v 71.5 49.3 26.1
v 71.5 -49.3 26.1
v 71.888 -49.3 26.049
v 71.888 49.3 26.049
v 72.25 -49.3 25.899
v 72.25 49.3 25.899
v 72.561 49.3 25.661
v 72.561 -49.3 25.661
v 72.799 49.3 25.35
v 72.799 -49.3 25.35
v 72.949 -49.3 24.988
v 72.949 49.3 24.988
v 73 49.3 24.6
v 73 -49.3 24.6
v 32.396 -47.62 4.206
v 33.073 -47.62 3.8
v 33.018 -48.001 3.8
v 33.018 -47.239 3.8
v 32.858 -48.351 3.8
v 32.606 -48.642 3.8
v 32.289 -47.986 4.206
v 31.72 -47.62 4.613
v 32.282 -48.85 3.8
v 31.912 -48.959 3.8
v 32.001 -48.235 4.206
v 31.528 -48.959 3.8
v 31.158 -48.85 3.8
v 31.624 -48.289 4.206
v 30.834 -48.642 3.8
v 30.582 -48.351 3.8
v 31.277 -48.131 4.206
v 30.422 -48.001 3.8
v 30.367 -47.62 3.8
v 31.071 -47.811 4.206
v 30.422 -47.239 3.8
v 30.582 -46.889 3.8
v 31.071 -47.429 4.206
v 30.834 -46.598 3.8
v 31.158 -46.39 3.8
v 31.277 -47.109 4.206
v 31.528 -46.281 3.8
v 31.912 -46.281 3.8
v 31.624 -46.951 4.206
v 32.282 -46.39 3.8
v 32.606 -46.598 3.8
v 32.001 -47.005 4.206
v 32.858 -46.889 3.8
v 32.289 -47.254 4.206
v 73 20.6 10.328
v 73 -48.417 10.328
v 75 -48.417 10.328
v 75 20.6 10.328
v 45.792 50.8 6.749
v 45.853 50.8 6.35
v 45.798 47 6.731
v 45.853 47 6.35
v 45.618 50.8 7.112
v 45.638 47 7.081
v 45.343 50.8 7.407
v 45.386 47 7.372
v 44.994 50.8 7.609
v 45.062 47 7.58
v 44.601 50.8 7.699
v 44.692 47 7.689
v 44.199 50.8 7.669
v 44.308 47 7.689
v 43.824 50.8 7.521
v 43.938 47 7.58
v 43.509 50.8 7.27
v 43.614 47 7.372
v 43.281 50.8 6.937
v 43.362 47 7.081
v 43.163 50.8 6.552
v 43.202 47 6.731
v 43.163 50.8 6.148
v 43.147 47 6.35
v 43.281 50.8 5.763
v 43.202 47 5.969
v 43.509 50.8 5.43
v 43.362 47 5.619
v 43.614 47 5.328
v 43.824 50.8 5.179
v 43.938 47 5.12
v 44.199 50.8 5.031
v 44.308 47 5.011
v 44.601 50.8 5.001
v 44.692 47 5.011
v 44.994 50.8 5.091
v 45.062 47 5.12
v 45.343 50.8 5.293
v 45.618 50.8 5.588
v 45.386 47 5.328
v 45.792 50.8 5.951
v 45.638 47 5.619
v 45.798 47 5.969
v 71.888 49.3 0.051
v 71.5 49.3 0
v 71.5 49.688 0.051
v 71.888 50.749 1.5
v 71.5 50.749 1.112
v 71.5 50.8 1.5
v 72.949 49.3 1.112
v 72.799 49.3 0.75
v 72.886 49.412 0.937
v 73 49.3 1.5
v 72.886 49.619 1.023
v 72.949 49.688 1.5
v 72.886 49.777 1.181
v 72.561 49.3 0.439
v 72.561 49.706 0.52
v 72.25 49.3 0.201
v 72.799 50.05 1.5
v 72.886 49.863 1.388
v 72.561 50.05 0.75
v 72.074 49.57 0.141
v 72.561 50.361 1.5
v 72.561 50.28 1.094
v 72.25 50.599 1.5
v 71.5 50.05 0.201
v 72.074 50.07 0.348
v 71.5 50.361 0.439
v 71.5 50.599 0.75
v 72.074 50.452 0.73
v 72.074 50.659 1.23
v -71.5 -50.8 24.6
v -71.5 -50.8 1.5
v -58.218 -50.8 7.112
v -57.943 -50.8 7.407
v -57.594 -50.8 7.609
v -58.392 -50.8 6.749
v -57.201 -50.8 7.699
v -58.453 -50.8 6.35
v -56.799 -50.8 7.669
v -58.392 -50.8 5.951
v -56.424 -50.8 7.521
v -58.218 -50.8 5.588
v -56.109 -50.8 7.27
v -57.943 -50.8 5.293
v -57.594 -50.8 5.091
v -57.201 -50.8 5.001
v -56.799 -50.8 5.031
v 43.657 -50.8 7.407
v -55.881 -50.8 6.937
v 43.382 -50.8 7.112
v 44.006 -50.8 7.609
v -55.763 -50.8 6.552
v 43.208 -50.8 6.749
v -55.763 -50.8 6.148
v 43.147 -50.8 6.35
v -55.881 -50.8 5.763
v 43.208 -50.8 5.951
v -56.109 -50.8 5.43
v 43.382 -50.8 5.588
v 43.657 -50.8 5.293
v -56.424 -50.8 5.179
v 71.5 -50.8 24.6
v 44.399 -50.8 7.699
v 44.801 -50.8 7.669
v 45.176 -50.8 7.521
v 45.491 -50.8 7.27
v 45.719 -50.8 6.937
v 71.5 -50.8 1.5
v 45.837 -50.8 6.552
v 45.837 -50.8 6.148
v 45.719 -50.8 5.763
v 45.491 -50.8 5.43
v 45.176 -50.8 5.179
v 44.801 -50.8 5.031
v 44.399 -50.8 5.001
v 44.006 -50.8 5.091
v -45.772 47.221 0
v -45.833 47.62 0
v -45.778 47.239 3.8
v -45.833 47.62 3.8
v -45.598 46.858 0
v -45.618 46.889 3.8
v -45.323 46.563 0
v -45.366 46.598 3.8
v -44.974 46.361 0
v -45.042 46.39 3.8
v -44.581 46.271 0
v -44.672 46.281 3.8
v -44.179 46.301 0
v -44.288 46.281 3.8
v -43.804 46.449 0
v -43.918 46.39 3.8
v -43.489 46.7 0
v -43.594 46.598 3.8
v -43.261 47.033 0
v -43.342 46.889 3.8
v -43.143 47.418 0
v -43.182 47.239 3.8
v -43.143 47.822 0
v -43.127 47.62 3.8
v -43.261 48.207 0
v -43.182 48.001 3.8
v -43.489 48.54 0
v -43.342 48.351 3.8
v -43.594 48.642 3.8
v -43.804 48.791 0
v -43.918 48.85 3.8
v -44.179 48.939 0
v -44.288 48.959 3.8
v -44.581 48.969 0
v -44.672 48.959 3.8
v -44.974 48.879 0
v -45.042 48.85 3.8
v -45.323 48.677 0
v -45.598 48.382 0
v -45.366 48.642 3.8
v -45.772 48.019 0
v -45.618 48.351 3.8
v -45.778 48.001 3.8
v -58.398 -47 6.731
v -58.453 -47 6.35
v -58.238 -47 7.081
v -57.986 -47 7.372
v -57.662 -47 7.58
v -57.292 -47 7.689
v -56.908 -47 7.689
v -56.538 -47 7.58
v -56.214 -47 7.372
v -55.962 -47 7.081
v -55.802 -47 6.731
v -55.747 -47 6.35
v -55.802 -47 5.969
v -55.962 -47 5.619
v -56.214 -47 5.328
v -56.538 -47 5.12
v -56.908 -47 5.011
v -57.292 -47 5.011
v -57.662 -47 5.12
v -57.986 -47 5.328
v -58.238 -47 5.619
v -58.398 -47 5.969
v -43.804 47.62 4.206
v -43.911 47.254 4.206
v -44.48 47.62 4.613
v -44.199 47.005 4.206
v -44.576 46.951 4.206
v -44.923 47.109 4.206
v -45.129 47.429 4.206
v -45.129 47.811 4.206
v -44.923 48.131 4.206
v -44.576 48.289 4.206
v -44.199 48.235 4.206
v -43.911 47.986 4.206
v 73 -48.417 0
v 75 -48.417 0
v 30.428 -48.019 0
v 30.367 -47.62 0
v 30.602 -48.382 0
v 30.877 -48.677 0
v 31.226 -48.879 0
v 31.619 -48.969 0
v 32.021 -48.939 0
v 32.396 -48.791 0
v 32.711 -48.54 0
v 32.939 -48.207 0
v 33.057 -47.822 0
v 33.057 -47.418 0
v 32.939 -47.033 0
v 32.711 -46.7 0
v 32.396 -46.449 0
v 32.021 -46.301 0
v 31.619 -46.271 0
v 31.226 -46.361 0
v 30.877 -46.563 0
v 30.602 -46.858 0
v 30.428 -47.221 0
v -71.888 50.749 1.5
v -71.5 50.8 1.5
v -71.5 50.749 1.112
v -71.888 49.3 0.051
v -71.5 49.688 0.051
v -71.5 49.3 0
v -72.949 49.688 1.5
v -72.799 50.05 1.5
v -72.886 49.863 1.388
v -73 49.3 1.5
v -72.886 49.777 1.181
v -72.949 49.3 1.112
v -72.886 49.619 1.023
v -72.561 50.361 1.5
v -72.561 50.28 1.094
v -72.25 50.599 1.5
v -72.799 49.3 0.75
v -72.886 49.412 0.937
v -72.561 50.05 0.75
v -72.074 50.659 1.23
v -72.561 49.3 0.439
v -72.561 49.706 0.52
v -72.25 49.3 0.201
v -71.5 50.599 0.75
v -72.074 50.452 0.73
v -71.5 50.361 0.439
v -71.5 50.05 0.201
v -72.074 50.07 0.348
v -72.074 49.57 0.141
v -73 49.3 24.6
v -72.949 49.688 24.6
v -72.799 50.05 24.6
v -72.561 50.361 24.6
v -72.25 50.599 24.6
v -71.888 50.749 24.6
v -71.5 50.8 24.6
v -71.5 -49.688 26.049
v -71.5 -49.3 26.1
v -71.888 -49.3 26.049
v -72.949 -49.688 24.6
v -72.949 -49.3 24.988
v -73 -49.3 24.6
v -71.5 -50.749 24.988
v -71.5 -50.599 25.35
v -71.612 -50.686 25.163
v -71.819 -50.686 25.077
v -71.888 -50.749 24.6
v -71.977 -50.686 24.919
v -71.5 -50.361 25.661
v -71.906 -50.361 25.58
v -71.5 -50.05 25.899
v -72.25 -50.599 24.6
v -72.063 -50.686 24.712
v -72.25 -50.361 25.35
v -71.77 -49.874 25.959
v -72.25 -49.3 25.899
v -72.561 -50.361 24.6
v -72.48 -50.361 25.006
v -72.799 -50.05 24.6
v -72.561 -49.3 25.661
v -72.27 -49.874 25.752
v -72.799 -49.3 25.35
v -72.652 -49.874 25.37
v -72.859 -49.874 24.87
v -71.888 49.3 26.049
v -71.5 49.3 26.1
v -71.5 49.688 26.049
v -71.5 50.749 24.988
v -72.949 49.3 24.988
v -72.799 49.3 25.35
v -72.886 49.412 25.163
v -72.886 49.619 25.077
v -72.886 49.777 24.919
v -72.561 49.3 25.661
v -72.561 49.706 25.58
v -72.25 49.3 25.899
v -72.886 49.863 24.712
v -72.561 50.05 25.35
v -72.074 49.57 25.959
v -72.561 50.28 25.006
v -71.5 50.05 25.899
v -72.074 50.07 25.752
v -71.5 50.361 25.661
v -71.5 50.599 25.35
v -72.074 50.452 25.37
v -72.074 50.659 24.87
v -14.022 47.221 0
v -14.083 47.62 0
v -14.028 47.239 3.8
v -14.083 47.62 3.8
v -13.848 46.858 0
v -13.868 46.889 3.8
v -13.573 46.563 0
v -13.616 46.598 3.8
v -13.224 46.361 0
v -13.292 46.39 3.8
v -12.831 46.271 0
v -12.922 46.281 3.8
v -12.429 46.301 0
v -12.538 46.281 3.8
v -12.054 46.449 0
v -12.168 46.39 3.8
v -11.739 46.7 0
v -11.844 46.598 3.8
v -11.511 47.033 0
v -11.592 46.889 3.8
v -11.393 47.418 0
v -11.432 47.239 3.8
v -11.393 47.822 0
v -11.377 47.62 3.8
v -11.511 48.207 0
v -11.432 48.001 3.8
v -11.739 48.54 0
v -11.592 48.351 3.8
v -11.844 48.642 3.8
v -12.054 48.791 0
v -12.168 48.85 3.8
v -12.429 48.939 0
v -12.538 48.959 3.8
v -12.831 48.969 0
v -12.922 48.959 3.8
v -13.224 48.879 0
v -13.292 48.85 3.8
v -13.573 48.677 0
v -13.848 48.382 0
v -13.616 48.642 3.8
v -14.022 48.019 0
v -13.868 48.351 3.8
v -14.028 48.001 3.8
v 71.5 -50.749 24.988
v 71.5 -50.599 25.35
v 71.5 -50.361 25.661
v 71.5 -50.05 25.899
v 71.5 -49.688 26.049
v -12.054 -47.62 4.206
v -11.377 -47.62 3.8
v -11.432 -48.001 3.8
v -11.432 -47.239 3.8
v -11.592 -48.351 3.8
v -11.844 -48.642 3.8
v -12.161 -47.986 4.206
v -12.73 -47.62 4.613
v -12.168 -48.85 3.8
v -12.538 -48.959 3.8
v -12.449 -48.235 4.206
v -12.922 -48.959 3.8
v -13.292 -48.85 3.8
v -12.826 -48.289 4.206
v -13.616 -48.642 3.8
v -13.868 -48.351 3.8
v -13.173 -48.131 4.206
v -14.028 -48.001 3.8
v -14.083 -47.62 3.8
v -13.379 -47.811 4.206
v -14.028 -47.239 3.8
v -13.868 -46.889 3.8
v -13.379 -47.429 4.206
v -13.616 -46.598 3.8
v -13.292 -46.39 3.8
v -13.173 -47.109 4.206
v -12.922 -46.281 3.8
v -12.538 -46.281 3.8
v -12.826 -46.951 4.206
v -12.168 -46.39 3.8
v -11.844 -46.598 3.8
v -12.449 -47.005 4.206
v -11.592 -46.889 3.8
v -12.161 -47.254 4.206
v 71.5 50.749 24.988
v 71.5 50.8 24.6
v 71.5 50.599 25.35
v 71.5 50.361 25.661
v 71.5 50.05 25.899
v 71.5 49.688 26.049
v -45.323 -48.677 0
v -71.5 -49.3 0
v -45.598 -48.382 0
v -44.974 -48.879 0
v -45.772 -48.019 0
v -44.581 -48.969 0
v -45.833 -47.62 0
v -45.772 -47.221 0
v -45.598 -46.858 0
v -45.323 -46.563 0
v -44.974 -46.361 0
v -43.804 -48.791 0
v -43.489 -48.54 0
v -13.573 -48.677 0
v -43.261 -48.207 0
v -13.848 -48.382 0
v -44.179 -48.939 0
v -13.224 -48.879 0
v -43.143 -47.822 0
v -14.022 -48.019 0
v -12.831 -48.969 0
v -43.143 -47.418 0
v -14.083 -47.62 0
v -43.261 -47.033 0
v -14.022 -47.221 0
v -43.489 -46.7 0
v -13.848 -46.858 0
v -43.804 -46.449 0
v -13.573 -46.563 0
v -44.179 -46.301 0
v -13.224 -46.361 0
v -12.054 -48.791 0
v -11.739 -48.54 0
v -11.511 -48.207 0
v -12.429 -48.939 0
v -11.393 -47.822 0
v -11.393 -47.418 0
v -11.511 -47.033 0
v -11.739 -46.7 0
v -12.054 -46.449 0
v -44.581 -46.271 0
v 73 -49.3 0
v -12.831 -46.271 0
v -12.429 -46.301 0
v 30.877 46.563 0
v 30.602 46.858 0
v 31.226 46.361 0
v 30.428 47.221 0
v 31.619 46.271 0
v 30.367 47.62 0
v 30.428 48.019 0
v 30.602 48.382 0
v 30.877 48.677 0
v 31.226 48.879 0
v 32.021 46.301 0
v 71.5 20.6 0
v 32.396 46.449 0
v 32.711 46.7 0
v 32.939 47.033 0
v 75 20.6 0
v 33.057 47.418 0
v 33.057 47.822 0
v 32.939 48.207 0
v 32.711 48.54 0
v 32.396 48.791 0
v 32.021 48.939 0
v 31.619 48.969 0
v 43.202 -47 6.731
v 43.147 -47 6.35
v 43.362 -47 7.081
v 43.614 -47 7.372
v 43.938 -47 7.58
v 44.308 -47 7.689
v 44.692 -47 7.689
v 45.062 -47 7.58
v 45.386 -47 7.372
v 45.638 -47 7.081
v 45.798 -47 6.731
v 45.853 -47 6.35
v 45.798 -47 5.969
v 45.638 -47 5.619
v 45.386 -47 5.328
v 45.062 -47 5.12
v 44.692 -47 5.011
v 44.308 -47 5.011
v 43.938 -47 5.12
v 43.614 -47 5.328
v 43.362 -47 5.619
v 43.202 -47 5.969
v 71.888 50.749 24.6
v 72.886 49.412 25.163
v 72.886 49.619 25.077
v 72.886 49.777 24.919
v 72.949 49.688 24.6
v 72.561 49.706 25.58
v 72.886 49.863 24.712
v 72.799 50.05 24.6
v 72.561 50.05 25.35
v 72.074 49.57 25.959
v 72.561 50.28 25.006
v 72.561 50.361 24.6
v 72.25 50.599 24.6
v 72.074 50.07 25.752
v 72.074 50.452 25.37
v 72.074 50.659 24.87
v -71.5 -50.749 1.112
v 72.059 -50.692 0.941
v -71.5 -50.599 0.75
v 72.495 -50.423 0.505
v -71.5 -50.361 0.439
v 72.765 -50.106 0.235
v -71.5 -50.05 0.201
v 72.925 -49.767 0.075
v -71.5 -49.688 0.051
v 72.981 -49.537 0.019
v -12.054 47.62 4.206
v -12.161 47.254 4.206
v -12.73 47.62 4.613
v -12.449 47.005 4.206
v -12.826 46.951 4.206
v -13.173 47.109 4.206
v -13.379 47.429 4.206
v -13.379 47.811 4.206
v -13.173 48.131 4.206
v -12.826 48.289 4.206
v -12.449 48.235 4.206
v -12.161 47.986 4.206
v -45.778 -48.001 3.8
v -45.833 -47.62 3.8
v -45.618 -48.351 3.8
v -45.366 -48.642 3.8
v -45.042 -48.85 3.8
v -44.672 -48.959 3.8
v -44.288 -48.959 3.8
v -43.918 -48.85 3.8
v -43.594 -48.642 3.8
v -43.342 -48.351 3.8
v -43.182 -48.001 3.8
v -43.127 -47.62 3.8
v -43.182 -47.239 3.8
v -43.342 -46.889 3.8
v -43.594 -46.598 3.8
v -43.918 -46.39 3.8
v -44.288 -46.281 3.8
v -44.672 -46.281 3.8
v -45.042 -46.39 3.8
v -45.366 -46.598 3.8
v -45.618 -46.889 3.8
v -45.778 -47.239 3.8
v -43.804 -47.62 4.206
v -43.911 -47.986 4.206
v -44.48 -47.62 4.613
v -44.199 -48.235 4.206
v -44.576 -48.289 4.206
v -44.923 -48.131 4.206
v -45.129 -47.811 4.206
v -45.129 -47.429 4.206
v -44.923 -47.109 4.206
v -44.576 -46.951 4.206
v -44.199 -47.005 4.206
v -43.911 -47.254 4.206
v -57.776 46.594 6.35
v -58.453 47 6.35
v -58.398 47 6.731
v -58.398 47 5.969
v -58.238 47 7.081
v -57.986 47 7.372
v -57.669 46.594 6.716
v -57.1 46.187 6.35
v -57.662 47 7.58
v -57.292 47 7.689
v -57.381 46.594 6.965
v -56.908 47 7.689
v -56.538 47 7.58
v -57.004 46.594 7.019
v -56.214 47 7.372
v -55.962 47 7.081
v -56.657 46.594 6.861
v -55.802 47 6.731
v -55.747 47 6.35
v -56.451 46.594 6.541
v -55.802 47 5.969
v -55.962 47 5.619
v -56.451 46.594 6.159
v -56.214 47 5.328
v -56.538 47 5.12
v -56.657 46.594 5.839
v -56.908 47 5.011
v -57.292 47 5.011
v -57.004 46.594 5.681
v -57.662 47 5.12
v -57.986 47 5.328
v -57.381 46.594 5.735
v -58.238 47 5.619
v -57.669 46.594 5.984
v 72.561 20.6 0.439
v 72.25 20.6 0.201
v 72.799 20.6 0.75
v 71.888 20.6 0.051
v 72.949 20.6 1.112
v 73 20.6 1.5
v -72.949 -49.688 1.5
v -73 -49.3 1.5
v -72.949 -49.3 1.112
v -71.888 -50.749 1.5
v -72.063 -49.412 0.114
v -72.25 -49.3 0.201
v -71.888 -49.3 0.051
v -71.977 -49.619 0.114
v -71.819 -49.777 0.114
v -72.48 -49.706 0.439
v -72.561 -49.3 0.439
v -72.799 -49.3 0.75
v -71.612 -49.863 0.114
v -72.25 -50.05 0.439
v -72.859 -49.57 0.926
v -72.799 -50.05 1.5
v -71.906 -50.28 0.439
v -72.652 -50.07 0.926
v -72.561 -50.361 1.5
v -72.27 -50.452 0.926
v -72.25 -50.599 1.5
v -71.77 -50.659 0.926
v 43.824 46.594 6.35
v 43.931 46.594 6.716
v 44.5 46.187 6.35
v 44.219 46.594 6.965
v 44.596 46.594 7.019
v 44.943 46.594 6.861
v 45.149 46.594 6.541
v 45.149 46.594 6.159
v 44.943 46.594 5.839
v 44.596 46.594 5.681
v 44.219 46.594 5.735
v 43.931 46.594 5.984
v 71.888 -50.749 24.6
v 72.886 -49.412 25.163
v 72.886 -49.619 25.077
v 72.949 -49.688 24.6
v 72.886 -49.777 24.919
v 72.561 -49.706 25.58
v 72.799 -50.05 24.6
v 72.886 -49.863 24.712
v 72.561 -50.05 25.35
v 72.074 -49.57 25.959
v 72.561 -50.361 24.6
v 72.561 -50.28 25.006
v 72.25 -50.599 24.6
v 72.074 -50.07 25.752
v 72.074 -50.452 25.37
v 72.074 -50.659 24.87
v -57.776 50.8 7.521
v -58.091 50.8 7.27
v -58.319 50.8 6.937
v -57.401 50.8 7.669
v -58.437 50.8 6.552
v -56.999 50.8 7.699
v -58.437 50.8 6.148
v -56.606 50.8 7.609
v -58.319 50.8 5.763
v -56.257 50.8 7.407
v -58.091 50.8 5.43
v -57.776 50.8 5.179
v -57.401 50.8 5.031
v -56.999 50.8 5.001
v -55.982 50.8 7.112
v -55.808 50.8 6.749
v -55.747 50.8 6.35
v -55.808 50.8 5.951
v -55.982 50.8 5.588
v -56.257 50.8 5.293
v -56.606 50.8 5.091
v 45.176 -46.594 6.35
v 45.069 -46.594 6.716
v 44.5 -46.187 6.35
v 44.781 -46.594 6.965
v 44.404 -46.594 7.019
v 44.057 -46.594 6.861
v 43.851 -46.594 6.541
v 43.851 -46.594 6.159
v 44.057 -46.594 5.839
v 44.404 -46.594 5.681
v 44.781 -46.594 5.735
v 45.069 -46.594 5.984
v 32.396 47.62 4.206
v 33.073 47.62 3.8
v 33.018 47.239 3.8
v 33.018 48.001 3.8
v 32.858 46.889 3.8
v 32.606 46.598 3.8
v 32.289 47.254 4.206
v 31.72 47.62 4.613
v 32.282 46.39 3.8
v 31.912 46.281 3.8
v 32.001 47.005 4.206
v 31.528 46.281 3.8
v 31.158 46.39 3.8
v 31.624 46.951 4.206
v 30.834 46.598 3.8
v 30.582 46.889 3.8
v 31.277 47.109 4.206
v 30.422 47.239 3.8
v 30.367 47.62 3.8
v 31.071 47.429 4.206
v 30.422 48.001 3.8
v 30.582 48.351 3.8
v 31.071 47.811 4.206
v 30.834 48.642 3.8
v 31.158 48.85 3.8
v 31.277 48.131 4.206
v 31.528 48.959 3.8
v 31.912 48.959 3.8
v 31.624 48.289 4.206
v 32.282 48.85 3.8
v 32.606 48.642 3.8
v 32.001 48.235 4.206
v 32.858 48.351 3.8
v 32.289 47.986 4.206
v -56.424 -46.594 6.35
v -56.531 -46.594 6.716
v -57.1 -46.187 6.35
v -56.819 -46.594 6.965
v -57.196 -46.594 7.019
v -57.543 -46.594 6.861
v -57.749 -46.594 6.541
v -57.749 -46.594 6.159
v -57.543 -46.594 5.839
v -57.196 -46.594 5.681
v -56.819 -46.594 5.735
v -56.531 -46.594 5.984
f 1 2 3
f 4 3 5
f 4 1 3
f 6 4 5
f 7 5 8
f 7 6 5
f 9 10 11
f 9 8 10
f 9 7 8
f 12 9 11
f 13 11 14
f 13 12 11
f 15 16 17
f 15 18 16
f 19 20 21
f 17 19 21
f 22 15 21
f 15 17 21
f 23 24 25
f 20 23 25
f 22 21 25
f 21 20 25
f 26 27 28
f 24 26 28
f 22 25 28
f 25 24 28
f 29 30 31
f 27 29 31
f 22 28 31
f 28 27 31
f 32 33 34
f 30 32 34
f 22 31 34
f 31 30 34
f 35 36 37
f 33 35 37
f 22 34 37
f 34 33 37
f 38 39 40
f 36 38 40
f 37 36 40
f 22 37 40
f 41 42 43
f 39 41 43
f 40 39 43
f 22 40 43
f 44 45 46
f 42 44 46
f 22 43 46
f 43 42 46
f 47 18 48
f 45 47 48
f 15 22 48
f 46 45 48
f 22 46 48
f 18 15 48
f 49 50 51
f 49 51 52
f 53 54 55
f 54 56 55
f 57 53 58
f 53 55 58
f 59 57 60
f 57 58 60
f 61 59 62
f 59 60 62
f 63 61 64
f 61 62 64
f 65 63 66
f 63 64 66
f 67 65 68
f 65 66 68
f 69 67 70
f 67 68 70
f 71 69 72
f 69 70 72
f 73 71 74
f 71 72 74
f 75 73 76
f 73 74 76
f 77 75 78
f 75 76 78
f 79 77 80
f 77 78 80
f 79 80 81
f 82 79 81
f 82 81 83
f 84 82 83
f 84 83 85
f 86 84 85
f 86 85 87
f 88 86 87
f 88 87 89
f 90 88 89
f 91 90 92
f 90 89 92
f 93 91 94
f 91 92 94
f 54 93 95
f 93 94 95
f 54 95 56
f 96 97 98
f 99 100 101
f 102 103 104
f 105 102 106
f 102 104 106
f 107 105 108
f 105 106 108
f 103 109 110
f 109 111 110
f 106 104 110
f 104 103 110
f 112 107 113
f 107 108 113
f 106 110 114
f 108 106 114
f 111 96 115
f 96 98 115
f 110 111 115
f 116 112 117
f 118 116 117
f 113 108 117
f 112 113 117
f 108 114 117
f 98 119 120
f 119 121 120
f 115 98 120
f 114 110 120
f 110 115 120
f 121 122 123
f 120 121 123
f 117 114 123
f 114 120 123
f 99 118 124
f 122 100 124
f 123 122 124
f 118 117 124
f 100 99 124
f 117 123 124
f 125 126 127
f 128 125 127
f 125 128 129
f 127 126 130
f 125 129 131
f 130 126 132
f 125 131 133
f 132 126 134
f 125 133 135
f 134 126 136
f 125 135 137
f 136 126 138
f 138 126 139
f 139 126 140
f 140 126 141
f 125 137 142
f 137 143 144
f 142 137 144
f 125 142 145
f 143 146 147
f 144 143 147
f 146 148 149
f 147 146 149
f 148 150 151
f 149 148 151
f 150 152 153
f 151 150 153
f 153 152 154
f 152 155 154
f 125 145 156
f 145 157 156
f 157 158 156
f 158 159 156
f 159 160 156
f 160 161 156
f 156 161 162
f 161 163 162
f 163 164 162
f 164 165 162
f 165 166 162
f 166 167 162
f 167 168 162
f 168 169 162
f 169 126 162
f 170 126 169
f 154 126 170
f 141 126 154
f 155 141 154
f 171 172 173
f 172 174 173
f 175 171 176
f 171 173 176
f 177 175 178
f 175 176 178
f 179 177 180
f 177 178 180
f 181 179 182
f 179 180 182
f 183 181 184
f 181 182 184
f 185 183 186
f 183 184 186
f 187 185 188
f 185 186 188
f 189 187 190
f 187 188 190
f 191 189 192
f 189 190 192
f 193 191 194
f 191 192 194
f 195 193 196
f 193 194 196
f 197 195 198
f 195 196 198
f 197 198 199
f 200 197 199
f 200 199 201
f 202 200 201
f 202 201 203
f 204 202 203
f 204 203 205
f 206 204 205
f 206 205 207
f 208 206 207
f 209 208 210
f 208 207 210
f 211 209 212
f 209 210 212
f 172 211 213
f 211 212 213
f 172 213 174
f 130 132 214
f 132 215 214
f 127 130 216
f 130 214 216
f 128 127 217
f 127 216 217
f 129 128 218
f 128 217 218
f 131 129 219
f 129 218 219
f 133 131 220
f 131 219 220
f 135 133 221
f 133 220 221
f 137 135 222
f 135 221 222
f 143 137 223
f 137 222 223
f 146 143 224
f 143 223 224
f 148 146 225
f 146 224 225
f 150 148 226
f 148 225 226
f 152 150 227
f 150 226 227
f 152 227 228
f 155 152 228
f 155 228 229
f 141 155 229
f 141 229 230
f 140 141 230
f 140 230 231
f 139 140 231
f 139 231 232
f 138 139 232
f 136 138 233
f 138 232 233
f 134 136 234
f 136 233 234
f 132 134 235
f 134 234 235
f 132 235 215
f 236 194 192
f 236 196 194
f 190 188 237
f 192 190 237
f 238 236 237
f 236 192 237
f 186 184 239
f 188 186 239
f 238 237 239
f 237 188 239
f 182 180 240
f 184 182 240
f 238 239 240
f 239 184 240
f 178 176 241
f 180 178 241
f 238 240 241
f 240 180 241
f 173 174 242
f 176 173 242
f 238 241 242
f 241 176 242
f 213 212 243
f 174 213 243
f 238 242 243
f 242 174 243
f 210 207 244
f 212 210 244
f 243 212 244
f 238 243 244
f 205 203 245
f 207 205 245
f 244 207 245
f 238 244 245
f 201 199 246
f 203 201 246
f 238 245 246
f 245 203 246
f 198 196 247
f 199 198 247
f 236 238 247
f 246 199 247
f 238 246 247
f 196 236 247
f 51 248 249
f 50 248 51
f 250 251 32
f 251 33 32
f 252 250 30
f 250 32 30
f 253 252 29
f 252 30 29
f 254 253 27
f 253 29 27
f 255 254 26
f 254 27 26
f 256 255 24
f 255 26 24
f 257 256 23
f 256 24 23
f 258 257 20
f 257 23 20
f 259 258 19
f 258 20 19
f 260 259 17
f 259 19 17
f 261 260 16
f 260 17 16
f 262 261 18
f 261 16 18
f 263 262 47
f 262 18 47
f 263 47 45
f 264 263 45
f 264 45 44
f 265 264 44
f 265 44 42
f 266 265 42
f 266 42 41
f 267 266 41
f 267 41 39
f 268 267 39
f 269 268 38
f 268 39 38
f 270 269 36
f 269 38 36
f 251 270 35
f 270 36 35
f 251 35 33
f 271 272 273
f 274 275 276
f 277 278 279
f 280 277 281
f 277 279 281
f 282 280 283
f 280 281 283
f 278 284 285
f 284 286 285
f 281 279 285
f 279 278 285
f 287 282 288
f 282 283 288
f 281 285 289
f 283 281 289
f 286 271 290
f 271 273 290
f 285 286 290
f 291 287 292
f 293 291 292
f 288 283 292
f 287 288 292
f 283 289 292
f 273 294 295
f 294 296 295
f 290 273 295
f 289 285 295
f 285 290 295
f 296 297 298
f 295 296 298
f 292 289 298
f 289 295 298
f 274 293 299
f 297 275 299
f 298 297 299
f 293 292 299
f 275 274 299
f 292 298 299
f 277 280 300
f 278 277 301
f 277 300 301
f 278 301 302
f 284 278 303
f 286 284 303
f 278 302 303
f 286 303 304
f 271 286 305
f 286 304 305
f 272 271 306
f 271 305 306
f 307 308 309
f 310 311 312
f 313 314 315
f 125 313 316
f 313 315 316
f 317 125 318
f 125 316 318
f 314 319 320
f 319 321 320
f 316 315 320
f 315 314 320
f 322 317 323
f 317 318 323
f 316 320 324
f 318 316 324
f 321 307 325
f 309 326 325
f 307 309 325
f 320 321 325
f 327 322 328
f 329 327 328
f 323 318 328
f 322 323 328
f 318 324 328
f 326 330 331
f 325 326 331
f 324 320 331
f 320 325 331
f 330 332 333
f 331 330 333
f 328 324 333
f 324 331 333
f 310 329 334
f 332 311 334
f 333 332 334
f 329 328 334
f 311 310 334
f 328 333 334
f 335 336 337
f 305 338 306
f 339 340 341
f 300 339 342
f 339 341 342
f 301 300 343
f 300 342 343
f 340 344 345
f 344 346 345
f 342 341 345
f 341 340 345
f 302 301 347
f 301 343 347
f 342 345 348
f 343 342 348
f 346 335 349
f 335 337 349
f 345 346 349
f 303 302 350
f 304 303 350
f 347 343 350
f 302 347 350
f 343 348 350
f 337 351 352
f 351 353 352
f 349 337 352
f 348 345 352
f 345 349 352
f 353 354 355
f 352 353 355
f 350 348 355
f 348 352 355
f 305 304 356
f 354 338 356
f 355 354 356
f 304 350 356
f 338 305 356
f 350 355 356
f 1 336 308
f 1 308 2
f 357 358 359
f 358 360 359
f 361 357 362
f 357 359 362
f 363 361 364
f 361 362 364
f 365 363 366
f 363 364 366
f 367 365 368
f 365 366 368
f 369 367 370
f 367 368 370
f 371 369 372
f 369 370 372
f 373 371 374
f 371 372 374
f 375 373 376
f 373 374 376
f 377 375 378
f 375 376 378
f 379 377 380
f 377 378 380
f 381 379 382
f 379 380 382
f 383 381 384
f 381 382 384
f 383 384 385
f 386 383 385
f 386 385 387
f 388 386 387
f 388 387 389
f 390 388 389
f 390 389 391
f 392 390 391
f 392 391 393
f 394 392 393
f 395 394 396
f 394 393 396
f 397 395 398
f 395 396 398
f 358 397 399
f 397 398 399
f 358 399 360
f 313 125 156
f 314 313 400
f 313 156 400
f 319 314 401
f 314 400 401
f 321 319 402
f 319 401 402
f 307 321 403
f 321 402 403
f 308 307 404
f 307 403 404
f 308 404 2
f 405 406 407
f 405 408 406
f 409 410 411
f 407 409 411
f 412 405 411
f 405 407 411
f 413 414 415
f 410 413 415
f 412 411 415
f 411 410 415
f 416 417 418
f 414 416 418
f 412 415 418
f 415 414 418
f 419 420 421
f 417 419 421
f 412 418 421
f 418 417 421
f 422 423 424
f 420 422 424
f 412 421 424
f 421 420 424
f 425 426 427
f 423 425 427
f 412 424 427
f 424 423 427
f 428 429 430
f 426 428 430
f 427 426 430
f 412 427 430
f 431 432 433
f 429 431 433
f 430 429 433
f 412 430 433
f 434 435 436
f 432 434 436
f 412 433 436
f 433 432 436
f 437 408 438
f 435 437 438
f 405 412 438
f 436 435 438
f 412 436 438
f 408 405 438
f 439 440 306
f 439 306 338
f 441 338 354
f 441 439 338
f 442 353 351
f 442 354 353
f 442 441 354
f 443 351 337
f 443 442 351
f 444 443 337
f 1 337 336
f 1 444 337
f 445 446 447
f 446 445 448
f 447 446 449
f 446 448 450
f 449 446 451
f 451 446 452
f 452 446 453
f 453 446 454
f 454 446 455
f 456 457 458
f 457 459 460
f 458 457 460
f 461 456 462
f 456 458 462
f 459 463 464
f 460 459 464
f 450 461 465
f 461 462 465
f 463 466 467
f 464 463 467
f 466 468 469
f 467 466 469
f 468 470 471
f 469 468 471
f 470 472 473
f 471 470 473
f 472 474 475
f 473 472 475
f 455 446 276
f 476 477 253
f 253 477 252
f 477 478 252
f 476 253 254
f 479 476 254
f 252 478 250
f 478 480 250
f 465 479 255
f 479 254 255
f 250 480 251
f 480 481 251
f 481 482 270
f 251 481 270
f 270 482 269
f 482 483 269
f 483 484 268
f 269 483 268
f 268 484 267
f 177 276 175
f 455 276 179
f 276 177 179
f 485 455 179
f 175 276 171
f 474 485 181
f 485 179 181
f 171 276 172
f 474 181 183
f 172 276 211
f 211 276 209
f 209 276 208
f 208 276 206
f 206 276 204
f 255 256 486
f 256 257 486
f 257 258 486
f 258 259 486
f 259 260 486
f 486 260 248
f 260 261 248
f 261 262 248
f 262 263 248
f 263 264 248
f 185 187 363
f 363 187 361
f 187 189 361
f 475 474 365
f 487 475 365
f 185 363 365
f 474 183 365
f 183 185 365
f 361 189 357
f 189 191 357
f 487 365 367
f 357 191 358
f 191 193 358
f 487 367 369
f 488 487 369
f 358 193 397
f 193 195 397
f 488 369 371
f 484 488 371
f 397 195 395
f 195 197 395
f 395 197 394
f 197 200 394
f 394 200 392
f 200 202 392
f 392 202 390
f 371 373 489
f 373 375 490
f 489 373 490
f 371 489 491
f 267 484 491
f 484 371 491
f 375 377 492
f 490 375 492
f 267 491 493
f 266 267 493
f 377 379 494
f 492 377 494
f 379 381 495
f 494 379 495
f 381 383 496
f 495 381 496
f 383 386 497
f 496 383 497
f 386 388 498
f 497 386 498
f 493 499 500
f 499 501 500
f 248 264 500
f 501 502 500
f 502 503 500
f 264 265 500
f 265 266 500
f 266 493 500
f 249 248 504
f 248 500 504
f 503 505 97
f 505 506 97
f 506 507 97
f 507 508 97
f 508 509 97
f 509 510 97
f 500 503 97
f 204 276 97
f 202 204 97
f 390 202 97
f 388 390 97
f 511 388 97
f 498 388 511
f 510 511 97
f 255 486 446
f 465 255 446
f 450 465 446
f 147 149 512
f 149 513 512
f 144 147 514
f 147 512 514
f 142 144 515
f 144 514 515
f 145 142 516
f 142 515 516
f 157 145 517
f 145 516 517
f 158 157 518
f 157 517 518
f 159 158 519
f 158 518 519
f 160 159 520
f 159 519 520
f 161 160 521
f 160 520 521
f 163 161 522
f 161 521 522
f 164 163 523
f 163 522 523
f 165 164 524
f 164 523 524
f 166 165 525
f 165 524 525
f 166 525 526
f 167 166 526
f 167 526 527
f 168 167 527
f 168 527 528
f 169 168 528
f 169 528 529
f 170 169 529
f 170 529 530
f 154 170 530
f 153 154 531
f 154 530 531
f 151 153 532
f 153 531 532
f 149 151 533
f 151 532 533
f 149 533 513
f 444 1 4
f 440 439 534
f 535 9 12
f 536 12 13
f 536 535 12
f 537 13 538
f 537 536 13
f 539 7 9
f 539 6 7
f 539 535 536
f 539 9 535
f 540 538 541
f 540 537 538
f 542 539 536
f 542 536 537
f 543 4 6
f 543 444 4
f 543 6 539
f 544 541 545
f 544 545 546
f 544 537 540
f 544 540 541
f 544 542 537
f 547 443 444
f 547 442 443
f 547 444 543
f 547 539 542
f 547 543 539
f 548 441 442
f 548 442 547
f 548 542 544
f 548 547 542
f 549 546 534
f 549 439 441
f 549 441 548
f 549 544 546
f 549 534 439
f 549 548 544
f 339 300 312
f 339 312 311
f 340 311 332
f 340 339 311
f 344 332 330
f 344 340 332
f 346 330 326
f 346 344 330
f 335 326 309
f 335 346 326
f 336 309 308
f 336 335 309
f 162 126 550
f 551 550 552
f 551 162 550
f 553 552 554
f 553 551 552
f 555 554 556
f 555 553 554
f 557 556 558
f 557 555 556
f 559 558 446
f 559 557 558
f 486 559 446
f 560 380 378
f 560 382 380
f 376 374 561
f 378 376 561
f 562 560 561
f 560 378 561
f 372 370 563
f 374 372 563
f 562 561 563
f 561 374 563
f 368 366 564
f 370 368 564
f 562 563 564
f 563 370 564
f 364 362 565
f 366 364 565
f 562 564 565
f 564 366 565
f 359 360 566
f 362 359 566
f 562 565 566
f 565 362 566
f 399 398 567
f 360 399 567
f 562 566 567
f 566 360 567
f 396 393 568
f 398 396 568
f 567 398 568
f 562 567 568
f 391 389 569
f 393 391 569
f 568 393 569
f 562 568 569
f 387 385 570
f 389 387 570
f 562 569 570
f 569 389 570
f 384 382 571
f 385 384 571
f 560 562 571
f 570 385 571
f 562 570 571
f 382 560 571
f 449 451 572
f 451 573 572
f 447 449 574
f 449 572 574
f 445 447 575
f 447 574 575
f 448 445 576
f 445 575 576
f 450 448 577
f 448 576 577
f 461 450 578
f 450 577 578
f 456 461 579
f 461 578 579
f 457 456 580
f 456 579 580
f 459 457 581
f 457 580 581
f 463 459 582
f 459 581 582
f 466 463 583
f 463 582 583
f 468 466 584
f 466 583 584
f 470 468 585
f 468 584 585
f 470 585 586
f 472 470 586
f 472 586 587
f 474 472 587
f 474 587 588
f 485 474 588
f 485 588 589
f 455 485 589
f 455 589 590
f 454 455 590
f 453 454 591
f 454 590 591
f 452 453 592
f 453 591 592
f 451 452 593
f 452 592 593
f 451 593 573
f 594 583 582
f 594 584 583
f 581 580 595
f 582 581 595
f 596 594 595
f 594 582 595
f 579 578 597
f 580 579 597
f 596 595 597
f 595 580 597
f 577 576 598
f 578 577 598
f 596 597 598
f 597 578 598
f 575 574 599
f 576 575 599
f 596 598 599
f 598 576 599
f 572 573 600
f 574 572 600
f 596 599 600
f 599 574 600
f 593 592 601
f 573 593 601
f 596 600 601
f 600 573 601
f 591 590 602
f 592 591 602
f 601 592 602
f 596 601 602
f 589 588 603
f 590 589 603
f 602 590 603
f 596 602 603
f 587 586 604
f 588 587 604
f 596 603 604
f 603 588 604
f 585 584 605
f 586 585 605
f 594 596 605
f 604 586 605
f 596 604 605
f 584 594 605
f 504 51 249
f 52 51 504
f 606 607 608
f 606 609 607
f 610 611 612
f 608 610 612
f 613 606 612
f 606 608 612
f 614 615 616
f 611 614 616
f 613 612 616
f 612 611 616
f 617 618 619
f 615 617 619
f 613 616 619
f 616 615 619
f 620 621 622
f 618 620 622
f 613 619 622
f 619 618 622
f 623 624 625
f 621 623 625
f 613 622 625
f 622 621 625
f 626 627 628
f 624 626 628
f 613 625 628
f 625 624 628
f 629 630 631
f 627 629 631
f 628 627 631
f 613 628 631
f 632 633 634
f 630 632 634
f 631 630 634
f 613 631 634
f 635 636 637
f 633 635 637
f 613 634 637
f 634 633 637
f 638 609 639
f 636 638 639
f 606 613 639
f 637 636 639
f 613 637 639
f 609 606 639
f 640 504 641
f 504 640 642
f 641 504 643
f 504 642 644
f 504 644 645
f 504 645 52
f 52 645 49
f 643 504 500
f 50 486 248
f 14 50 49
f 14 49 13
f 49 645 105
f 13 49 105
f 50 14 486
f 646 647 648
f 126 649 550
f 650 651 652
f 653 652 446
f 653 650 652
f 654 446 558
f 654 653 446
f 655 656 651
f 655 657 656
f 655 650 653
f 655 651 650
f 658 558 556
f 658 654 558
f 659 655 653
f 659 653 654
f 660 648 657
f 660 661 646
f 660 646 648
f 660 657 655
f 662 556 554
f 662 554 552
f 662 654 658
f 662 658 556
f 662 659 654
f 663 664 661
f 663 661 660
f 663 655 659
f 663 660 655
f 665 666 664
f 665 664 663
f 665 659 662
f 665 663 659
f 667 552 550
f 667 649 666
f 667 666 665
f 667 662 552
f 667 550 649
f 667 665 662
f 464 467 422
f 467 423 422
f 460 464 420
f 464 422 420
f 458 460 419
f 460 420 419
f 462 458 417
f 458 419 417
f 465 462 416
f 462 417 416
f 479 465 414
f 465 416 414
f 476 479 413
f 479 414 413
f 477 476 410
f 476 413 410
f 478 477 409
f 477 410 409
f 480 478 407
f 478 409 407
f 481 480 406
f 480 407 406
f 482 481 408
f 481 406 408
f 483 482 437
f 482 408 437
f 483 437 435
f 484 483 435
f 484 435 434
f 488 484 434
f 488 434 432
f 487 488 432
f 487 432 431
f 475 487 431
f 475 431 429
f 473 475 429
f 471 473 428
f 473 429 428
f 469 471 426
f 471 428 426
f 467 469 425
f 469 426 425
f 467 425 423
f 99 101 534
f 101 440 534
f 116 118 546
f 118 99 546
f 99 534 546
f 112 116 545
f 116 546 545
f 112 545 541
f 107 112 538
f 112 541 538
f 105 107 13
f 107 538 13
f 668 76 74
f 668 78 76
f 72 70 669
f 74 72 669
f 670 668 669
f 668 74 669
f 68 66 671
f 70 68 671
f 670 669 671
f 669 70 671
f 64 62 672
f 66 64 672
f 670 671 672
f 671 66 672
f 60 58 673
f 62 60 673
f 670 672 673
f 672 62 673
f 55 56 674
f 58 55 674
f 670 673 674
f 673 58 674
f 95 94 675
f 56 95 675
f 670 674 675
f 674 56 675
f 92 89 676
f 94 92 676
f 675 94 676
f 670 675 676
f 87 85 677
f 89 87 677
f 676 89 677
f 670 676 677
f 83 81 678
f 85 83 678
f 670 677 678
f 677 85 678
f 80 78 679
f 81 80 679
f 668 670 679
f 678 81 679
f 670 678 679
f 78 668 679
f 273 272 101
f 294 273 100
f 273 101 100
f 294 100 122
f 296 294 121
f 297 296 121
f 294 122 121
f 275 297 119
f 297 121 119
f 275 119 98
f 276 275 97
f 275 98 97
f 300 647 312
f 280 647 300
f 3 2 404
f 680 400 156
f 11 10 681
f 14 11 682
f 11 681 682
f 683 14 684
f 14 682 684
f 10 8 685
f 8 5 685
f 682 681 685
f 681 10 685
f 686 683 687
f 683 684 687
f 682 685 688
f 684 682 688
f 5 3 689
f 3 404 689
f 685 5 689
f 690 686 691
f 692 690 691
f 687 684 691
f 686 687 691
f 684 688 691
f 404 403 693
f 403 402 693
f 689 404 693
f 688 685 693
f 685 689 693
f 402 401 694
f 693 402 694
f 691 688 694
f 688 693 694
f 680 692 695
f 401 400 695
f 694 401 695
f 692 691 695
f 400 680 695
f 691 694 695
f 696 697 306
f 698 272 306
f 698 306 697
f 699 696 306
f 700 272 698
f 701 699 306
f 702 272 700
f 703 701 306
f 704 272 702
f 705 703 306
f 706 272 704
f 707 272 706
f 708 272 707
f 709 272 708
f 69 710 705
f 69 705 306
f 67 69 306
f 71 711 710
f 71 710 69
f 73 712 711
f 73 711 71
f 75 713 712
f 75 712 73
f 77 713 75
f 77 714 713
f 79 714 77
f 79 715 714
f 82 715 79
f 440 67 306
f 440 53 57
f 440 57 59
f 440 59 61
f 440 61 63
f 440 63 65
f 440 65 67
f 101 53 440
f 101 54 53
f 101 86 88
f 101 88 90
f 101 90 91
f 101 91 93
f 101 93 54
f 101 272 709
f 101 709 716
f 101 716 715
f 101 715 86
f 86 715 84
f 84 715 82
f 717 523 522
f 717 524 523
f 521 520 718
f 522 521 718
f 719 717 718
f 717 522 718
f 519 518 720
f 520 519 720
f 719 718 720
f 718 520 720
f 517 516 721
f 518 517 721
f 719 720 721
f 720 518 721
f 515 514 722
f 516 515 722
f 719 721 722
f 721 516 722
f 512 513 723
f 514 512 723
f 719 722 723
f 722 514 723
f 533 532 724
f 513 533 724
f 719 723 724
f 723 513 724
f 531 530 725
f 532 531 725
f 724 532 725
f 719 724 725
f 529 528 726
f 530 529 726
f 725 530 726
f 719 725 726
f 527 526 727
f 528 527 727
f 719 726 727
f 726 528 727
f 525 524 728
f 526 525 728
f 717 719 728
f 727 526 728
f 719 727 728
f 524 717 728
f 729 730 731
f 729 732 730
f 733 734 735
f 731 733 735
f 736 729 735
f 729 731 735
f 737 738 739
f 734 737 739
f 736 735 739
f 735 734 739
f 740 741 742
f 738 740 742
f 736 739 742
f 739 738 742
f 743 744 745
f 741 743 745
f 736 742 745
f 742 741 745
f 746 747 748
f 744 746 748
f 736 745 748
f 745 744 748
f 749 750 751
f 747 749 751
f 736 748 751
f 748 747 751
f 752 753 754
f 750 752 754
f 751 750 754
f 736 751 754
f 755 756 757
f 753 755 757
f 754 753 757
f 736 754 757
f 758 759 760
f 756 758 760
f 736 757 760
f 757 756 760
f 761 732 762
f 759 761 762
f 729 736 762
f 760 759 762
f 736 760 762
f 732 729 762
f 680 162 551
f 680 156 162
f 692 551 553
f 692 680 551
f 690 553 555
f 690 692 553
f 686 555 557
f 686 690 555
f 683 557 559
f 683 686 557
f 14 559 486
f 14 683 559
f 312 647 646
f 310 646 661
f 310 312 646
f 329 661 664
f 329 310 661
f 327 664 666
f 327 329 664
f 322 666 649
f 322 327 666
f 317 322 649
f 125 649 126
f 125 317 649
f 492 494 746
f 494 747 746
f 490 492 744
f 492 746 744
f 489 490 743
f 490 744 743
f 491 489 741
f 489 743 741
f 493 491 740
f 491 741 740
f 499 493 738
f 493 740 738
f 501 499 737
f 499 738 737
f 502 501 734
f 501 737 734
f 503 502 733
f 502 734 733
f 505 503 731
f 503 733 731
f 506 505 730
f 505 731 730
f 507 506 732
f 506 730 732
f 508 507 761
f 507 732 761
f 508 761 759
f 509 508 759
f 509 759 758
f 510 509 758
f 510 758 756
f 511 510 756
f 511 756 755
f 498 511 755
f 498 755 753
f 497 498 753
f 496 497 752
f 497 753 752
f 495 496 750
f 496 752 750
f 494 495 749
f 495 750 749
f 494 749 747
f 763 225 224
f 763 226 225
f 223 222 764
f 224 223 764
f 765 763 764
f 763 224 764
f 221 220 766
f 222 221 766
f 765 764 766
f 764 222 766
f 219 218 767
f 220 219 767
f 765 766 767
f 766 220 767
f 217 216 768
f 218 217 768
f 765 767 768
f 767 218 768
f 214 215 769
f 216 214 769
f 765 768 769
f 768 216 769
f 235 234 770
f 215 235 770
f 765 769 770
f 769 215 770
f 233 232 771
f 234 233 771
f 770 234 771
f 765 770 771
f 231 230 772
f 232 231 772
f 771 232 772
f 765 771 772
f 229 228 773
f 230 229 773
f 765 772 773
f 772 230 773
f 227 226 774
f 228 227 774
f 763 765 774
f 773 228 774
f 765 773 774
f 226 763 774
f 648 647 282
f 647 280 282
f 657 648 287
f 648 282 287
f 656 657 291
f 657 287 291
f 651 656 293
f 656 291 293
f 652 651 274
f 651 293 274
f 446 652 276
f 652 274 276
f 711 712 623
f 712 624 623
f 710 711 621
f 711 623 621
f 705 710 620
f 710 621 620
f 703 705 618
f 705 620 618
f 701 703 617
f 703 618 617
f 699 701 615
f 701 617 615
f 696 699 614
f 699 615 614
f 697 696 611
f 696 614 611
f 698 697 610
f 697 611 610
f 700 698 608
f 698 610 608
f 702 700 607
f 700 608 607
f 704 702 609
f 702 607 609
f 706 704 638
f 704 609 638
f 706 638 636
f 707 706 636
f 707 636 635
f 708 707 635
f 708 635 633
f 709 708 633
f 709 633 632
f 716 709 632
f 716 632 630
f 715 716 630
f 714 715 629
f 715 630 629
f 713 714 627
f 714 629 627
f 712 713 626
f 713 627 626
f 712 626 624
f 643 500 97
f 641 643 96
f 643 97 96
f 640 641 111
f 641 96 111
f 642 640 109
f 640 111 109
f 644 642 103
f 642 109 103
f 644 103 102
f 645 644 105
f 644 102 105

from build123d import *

# Parameters (mm, degrees)
F0_W           = 146
F0_H           = 101.6
F1_DEPTH       = 26.1
F5_D           = 2.7051
F5_DEPTH       = 3.8
F5_TIP         = 0.8126940303
F5_ON_F2_D     = 2.7051
F5_ON_F2_DEPTH = 3.8
F5_ON_F2_TIP   = 0.8126940303
F5_ON_F3_D     = 2.7051
F5_ON_F3_DEPTH = 3.8
F5_ON_F3_TIP   = 0.8126940303
F6_W           = 69.0162237734
F6_H           = 10.328435339
F7_DEPTH       = 2
F8_R           = 1.5


with BuildPart() as f1:
    # F0 (on Top) → F1 (new body)
    with BuildSketch(Plane.XY):
        Rectangle(F0_W, F0_H)
    extrude(amount=F1_DEPTH)

    # F5
    with Locations(Plane(origin=(0, 50.8, 0), x_dir=(-1, 0, 0), z_dir=(0, 1, 0))):
        with Locations((-44.5, 6.35), (57.1, 6.35)):
            Hole(F5_D / 2, depth=F5_DEPTH)
            with Locations((0, 0, -(F5_DEPTH + F5_TIP / 2))):  # 118° drill point
                Cone(0, F5_D / 2, F5_TIP, mode=Mode.SUBTRACT)

    # F5 on F2
    with Locations(Plane(origin=(0, 0, 0), x_dir=(1, 0, 0), z_dir=(0, 0, -1))):
        with Locations((-44.48, -47.62), (-12.73, -47.62), (31.72, -47.62), (31.72, 47.62), (-12.73, 47.62), (-44.48, 47.62)):
            Hole(F5_ON_F2_D / 2, depth=F5_ON_F2_DEPTH)
            with Locations((0, 0, -(F5_ON_F2_DEPTH + F5_ON_F2_TIP / 2))):  # 118° drill point
                Cone(0, F5_ON_F2_D / 2, F5_ON_F2_TIP, mode=Mode.SUBTRACT)

    # F5 on F3
    with Locations(Plane.XZ.offset(50.8)):
        with Locations((-57.1, 6.35), (44.5, 6.35)):
            Hole(F5_ON_F3_D / 2, depth=F5_ON_F3_DEPTH)
            with Locations((0, 0, -(F5_ON_F3_DEPTH + F5_ON_F3_TIP / 2))):  # 118° drill point
                Cone(0, F5_ON_F3_D / 2, F5_ON_F3_TIP, mode=Mode.SUBTRACT)

    # F6 (on face) → F7 (join)
    with BuildSketch(Plane.YZ.offset(73)):
        with Locations((-13.9085585251, 5.1642176695)):
            Rectangle(F6_W, F6_H)
    extrude(amount=F7_DEPTH)

    # F8
    f8_edges = [f1.edges().sort_by_distance(p)[0] for p in [
        (0, 50.8, 0),
        (0, 50.8, 26.1),
        (-73, 0, 26.1),
        (0, -50.8, 26.1),
        (73, 0, 26.1),
        (-73, 50.8, 13.05),
        (-73, -50.8, 13.05),
        (-73, 0, 0),
        (0, -50.8, 0),
        (73, 35.699777, 0),
        (73, -50.8, 13.05),
        (73, 50.8, 13.05),
    ]]
    fillet(f8_edges, radius=F8_R)


solid = f1.part
